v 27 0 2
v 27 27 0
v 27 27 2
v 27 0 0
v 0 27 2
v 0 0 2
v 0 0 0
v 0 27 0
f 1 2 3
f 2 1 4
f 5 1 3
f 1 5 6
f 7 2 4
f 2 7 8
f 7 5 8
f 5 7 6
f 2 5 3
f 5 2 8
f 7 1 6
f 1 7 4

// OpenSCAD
stoneW = 27;
stoneL = 27;
baseH = 2;
rimH = 2;
roofH = 35;
symbolL = 18;
symbolH = 1;
wall = 1;



color("green")
    cube([stoneW, stoneL, 2]);

color("red")
      translate([-11, 42, baseH / 2])
          linear_extrude(
            height = symbolH+baseH / 2, 
            center = false, 
            convexity = 10, 
            twist = 0
      )
          resize([0,symbolL,0], auto=true)
              horse();
            
// Group ID: layer1
module horse() {
	// Group ID: g27
	union() {
		// Group ID: Layer_x0020_1
		union() {
			// Path ID: Pruzkumnik
			difference() {
				bezier_polygon([[[69.04049160000001, -61.67434295], [67.34752356, -61.133533715000006], [67.51211767500001, -59.910834575], [66.195364755, -59.887321130000004]], [[66.195364755, -59.887321130000004], [65.34888073500001, -60.804345485000006], [65.63104207500001, -61.20407405], [65.67806896500001, -62.80298831]], [[65.67806896500001, -62.80298831], [64.220235375, -62.473800080000004], [59.21187159, -57.95921864], [59.89376149500001, -61.180560605000004]], [[59.89376149500001, -61.180560605000004], [59.89376149500001, -61.180560605000004], [61.304568195, -64.566496685], [61.304568195, -64.566496685]], [[61.304568195, -64.566496685], [61.304568195, -64.566496685], [58.106739675, -69.62188736], [58.106739675, -69.62188736]], [[58.106739675, -69.62188736], [57.23674221, -70.3743176], [56.507825415, -70.585938605], [55.96701618, -71.73809741000001]], [[55.96701618, -71.73809741000001], [55.02647838, -73.689713345], [56.131610295, -73.90133435], [55.96701618, -75.45322172]], [[55.96701618, -75.45322172], [55.96701618, -75.45322172], [54.06242713500001, -75.899977175], [54.06242713500001, -75.899977175]], [[54.06242713500001, -75.899977175], [54.250534695000006, -78.03970067], [55.543774170000006, -78.110241005], [57.119174985, -78.95672502500001]], [[57.119174985, -78.95672502500001], [57.119174985, -78.95672502500001], [54.132967470000004, -82.74238967000001], [54.132967470000004, -82.74238967000001]], [[54.132967470000004, -82.74238967000001], [52.5810801, -83.75346780500001], [53.215943115, -82.03698632000001], [50.723517945000005, -86.198866085]], [[50.723517945000005, -86.198866085], [48.748388565000006, -89.49074838500002], [51.664055745000006, -86.38697364500001], [49.47730536, -90.83101475000001]], [[49.47730536, -90.83101475000001], [48.630821340000004, -92.54749623500001], [48.01947177, -94.052356715], [48.53676756, -96.28613399000001]], [[48.53676756, -96.28613399000001], [49.124603685000004, -98.77855916000001], [50.065141485000005, -99.20180117000001], [50.65297761, -100.82422887500002]], [[50.65297761, -100.82422887500002], [51.546488520000004, -103.22260026500001], [50.65297761, -104.28070529000001], [53.968373355000004, -104.09259773000002]], [[53.968373355000004, -104.09259773000002], [56.76647331, -103.95151706000001], [59.56457326500001, -106.67907668000002], [61.845377430000006, -101.64719945000002]], [[61.845377430000006, -101.64719945000002], [61.845377430000006, -101.64719945000002], [62.762401785, -100.49504064500002], [62.762401785, -100.49504064500002]], [[62.762401785, -100.49504064500002], [62.762401785, -100.49504064500002], [63.58537236, -102.86989859000002], [63.58537236, -102.86989859000002]], [[63.58537236, -102.86989859000002], [65.113746285, -102.705304475], [66.242391645, -101.12990366], [66.83022777000001, -100.70666165]], [[66.83022777000001, -100.70666165], [67.20644289, -100.42450031], [67.53563112, -100.35395997500001], [67.95887313, -100.09531208000001]], [[67.95887313, -100.09531208000001], [68.217521025, -98.07315581], [67.371037005, -98.002615475], [67.06536222, -96.16856676500001]], [[67.06536222, -96.16856676500001], [68.19400758, -95.48667686000002], [70.051569735, -94.42857183500001], [71.862105, -94.26397772000001]], [[71.862105, -94.26397772000001], [71.885618445, -95.08694829500001], [71.62697055000001, -95.67478442000001], [71.95615878000001, -96.38018777]], [[71.95615878000001, -96.38018777], [73.76669404500001, -96.75640289], [74.54263773, -96.47424155000002], [75.882904095, -96.05099954]], [[75.882904095, -96.05099954], [76.32965955, -103.22260026500001], [75.130473855, -107.43150692], [79.645055295, -113.380408505]], [[79.645055295, -113.380408505], [80.25640486500001, -114.179865635], [80.303431755, -114.509053865], [81.54964434, -114.60310764500001]], [[81.54964434, -114.60310764500001], [84.27720396000001, -109.242042185], [87.68665348500001, -111.61690013], [95.163928995, -104.821514525]], [[95.163928995, -104.821514525], [95.493117225, -104.56286663], [95.728251675, -104.32773218], [96.03392646, -104.069084285]], [[96.03392646, -104.069084285], [96.762843255, -103.457734715], [96.26906091000001, -103.55178849500001], [97.11554493000001, -103.55178849500001]], [[97.11554493000001, -103.55178849500001], [97.468246605, -107.43150692], [95.37555, -109.43014974500001], [95.540144115, -111.05257745]], [[95.540144115, -111.05257745], [96.92743737, -111.123117785], [100.94823646500001, -108.27799094000001], [101.93580115500001, -105.19772964500001]], [[101.93580115500001, -105.19772964500001], [104.47525321500001, -97.29721212500002], [98.62040541, -91.72452566000001], [100.383913785, -82.906983785]], [[100.383913785, -82.906983785], [101.01877680000001, -79.68564182], [102.52363728, -75.758896505], [102.80579862, -72.53755454]], [[102.80579862, -72.53755454], [103.06444651500001, -69.64540080500001], [101.982828045, -69.739454585], [100.45445412000001, -68.563782335]], [[100.45445412000001, -68.563782335], [98.99662053, -67.45865042], [99.913644885, -67.45865042], [96.856897035, -65.78919582500001]], [[96.856897035, -65.78919582500001], [95.37555, -64.989738695], [94.505552535, -64.237308455], [92.765557605, -63.46136477]], [[92.765557605, -63.46136477], [90.555293775, -62.473800080000004], [89.802863535, -60.192995915000004], [84.206663625, -59.181917780000006]], [[84.206663625, -59.181917780000006], [82.278561135, -58.829216105], [80.32694520000001, -59.558132900000004], [78.422356155, -59.81678079500001]], [[78.422356155, -59.81678079500001], [74.613178065, -60.287049695], [72.44994112500001, -57.042194285], [69.04049160000001, -61.67434295]], [[69.04049160000001, -61.67434295], [69.04049160000001, -61.67434295], [69.04049160000001, -61.67434295], [69.04049160000001, -61.67434295]], [[69.04049160000001, -61.67434295], [69.04049160000001, -61.67434295], [69.04049160000001, -61.67434295], [69.04049160000001, -61.67434295]]]);
				bezier_polygon([[[58.671062355000004, -99.03720705500001], [59.25889848, -100.23639275000001], [58.459441350000006, -99.93071796500001], [57.119174985, -101.97638768]], [[57.119174985, -101.97638768], [56.601879195, -102.752331365], [56.62539264, -102.28206246500001], [56.67241953, -103.01097926]], [[56.67241953, -103.01097926], [58.55349513, -103.410707825], [59.188358145, -102.91692548], [59.91727494, -101.81179356500002]], [[59.91727494, -101.81179356500002], [60.269976615000004, -101.294497775], [61.727810205000004, -98.87261294000001], [61.845377430000006, -98.59045160000001]], [[61.845377430000006, -98.59045160000001], [61.234027860000005, -98.04964236500001], [61.304568195, -97.95558858500002], [60.693218625, -97.46180624000002]], [[60.693218625, -97.46180624000002], [59.658627045, -98.519911265], [60.48159762, -98.37883059500001], [58.671062355000004, -99.03720705500001]], [[58.671062355000004, -99.03720705500001], [58.671062355000004, -99.03720705500001], [58.671062355000004, -99.03720705500001], [58.671062355000004, -99.03720705500001]], [[58.671062355000004, -99.03720705500001], [58.671062355000004, -99.03720705500001], [58.671062355000004, -99.03720705500001], [58.671062355000004, -99.03720705500001]]]);
				bezier_polygon([[[64.90212528, -93.44100714500001], [65.23131351, -94.146410495], [65.60752863, -94.49911217], [66.101310975, -94.96938107]], [[66.101310975, -94.96938107], [68.5702227, -93.79370882], [66.524552985, -94.005329825], [72.14426634, -91.98317355500001]], [[72.14426634, -91.98317355500001], [72.14426634, -91.98317355500001], [72.12075289500001, -88.19750891000001], [72.12075289500001, -88.19750891000001]], [[72.12075289500001, -88.19750891000001], [71.57994366, -88.19750891000001], [65.18428662, -93.08830547000001], [64.90212528, -93.44100714500001]], [[64.90212528, -93.44100714500001], [64.90212528, -93.44100714500001], [64.90212528, -93.44100714500001], [64.90212528, -93.44100714500001]], [[64.90212528, -93.44100714500001], [64.90212528, -93.44100714500001], [64.90212528, -93.44100714500001], [64.90212528, -93.44100714500001]]]);
				bezier_polygon([[[72.37940079, -80.29699139], [68.33508825000001, -81.731311535], [69.769408395, -86.76318876500001], [73.43750581500001, -86.292919865]], [[73.43750581500001, -86.292919865], [77.45830491000001, -85.79913752], [75.177500745, -79.285913255], [72.37940079, -80.29699139]], [[72.37940079, -80.29699139], [72.37940079, -80.29699139], [72.37940079, -80.29699139], [72.37940079, -80.29699139]], [[72.37940079, -80.29699139], [72.37940079, -80.29699139], [72.37940079, -80.29699139], [72.37940079, -80.29699139]]]);
				bezier_polygon([[[57.072148095, -77.33429732], [57.072148095, -77.33429732], [58.388901015, -77.61645866], [58.388901015, -77.61645866]], [[58.388901015, -77.61645866], [59.07079092, -73.736740235], [59.423492595, -73.54863267500001], [61.65726987000001, -71.59701674]], [[61.65726987000001, -71.59701674], [65.019692505, -68.65783611500001], [63.11510346, -70.96215372500001], [63.820506810000005, -68.93999745500001]], [[63.820506810000005, -68.93999745500001], [64.267262265, -67.764325205], [65.489961405, -67.38811008500001], [66.054284085, -66.42405884]], [[66.054284085, -66.42405884], [66.054284085, -66.42405884], [65.63104207500001, -64.80163113500001], [65.63104207500001, -64.80163113500001]], [[65.63104207500001, -64.80163113500001], [64.361316045, -64.989738695], [62.527267335000005, -65.883249605], [61.98645810000001, -66.588652955]], [[61.98645810000001, -66.588652955], [61.351595085, -67.41162353], [61.13997408, -69.034051235], [60.034842165, -70.23323693]], [[60.034842165, -70.23323693], [59.23538503500001, -71.12674784000001], [57.61295733, -71.479449515], [57.777551445, -73.61917301]], [[57.777551445, -73.61917301], [57.848091780000004, -74.6067377], [58.36538757, -74.93592593000001], [58.27133379, -75.71186961500001]], [[58.27133379, -75.71186961500001], [58.177280010000004, -76.72294775], [57.589443885, -76.58186708000001], [57.072148095, -77.33429732]], [[57.072148095, -77.33429732], [57.072148095, -77.33429732], [57.072148095, -77.33429732], [57.072148095, -77.33429732]], [[57.072148095, -77.33429732], [57.072148095, -77.33429732], [57.072148095, -77.33429732], [57.072148095, -77.33429732]]]);
				bezier_polygon([[[73.813720935, -78.862671245], [74.63669151, -78.25132167500001], [75.036420075, -77.61645866], [75.41263519500001, -76.81700153]], [[75.41263519500001, -76.81700153], [70.78048653, -72.11431253], [73.672640265, -68.751889895], [72.23832012, -65.930276495]], [[72.23832012, -65.930276495], [72.23832012, -65.930276495], [71.76805122, -66.494599175], [71.76805122, -66.494599175]], [[71.76805122, -66.494599175], [70.945080645, -67.764325205], [71.43886299, -68.093513435], [69.83994873, -68.39918822]], [[69.83994873, -68.39918822], [69.83994873, -68.39918822], [68.99346471, -66.18892439000001], [68.99346471, -66.18892439000001]], [[68.99346471, -66.18892439000001], [68.687789925, -65.318926925], [68.546709255, -64.566496685], [67.81779246, -64.47244290500001]], [[67.81779246, -64.47244290500001], [67.27698322500001, -64.895684915], [67.51211767500001, -64.54298324], [67.44157734000001, -65.365953815]], [[67.44157734000001, -65.365953815], [67.27698322500001, -67.31756975], [69.5107605, -69.38675291], [70.568865525, -71.54998985]], [[70.568865525, -71.54998985], [71.25075543, -72.91376966], [73.22588481, -78.204294785], [73.813720935, -78.862671245]], [[73.813720935, -78.862671245], [73.813720935, -78.862671245], [73.813720935, -78.862671245], [73.813720935, -78.862671245]], [[73.813720935, -78.862671245], [73.813720935, -78.862671245], [73.813720935, -78.862671245], [73.813720935, -78.862671245]]]);
				bezier_polygon([[[52.39297254, -102.98746581500001], [55.261612830000004, -103.29314060000002], [56.531338860000005, -100.35395997500001], [57.89511867, -98.94315327500001]], [[57.89511867, -98.94315327500001], [57.848091780000004, -98.896126385], [57.777551445, -98.75504571500001], [57.754038, -98.802072605]], [[57.754038, -98.802072605], [57.56593044, -99.20180117000001], [57.495390105000006, -98.54342471000001], [57.47187666000001, -98.49639782000001]], [[57.47187666000001, -98.49639782000001], [56.837013645, -97.69694069000002], [56.62539264, -96.262620545], [57.63647077500001, -95.557217195]], [[57.63647077500001, -95.557217195], [57.63647077500001, -95.557217195], [58.92971025, -94.945867625], [58.92971025, -94.945867625]], [[58.92971025, -94.945867625], [58.318360680000005, -93.37046681000001], [57.401336325, -92.59452312500001], [56.272690965, -91.701012215]], [[56.272690965, -91.701012215], [55.097018715000004, -90.760474415], [54.39161536500001, -89.866963505], [52.76918766, -89.39669460500001]], [[52.76918766, -89.39669460500001], [51.217300290000004, -90.525339965], [49.759466700000004, -93.11181891500001], [50.065141485000005, -96.00397265000001]], [[50.065141485000005, -96.00397265000001], [50.206222155000006, -97.344239015], [50.676491055, -98.472884375], [51.26432718, -99.38990873]], [[51.26432718, -99.38990873], [52.157838090000006, -100.777201985], [52.040270865000004, -101.22395744000002], [52.39297254, -102.98746581500001]], [[52.39297254, -102.98746581500001], [52.39297254, -102.98746581500001], [52.39297254, -102.98746581500001], [52.39297254, -102.98746581500001]], [[52.39297254, -102.98746581500001], [52.39297254, -102.98746581500001], [52.39297254, -102.98746581500001], [52.39297254, -102.98746581500001]]]);
				bezier_polygon([[[51.59351541, -87.75075345500001], [52.25189187, -88.503183695], [52.651620435000005, -88.43264336], [53.545131345, -88.85588537000001]], [[53.545131345, -88.85588537000001], [58.482954795000005, -91.16020298000001], [59.39997915000001, -94.616679395], [61.116460635, -96.709376]], [[61.116460635, -96.709376], [62.033484990000005, -97.83802136], [63.138616905000006, -98.68450538], [63.655912695000005, -100.33044653]], [[63.655912695000005, -100.33044653], [63.655912695000005, -100.33044653], [66.6891471, -98.519911265], [66.6891471, -98.519911265]], [[66.6891471, -98.519911265], [66.26590509, -95.90991887000001], [64.07915470500001, -94.59316595000001], [63.232670685, -92.80614413]], [[63.232670685, -92.80614413], [64.10266815, -90.97209542], [69.81643528500001, -88.24453580000001], [70.568865525, -86.41048709]], [[70.568865525, -86.41048709], [70.568865525, -86.41048709], [69.83994873, -85.65805685000001], [69.83994873, -85.65805685000001]], [[69.83994873, -85.65805685000001], [68.89941093, -85.89319130000001], [66.61860676500001, -87.844807235], [65.819149635, -88.52669714000001]], [[65.819149635, -88.52669714000001], [65.160773175, -89.09101982], [64.502396715, -89.443721495], [63.844020255000004, -90.00804417500001]], [[63.844020255000004, -90.00804417500001], [63.06807657, -90.713447525], [62.80942867500001, -91.20722987], [61.5161892, -91.25425676]], [[61.5161892, -91.25425676], [61.18700097, -90.64290719], [61.18700097, -90.61939374500001], [61.18700097, -89.772909725]], [[61.18700097, -89.772909725], [60.29349006, -90.290205515], [60.34051695, -89.302640825], [57.754038, -87.303998]], [[57.754038, -87.303998], [56.531338860000005, -86.339946755], [55.285126275, -85.07022072500001], [53.56864479, -84.62346527]], [[53.56864479, -84.62346527], [52.816214550000005, -85.18778795], [51.73459608, -86.64562154000001], [51.59351541, -87.75075345500001]], [[51.59351541, -87.75075345500001], [51.59351541, -87.75075345500001], [51.59351541, -87.75075345500001], [51.59351541, -87.75075345500001]], [[51.59351541, -87.75075345500001], [51.59351541, -87.75075345500001], [51.59351541, -87.75075345500001], [51.59351541, -87.75075345500001]]]);
				bezier_polygon([[[55.332153165, -83.75346780500001], [55.332153165, -83.75346780500001], [60.175922835, -88.07994168500001], [60.175922835, -88.07994168500001]], [[60.175922835, -88.07994168500001], [60.834299295, -88.66777781], [61.13997408, -89.208587045], [61.84537743, -89.72588283500001]], [[61.84537743, -89.72588283500001], [63.044563125, -89.302640825], [68.734816815, -84.599951825], [68.781843705, -84.552924935]], [[68.781843705, -84.552924935], [69.205085715, -83.96508881], [68.89941093, -84.62346527], [69.08751849000001, -83.753467805]], [[69.08751849000001, -83.753467805], [69.13454538, -83.51833335500001], [69.15805882500001, -83.142118235], [69.22859916, -82.83644345]], [[69.22859916, -82.83644345], [69.393193275, -82.107526655], [69.5107605, -81.91941909500001], [69.86346217500001, -81.37860986000001]], [[69.86346217500001, -81.37860986000001], [70.63940586000001, -80.20293761], [70.898053755, -80.39104517000001], [70.16913696, -78.627536795]], [[70.16913696, -78.627536795], [69.111031935, -76.06457129], [67.25346978, -72.72566210000001], [65.30185384500001, -71.056207505]], [[65.30185384500001, -71.056207505], [64.267262265, -71.432422625], [62.80942867500001, -72.702148655], [62.17456566, -73.43106545]], [[62.17456566, -73.43106545], [60.881326185000006, -74.912412485], [60.834299295, -74.81835870500001], [60.269976615000004, -77.122676315]], [[60.269976615000004, -77.122676315], [59.635113600000004, -79.87374938], [56.648906085, -80.60266617500001], [55.332153165, -83.75346780500001]], [[55.332153165, -83.75346780500001], [55.332153165, -83.75346780500001], [55.332153165, -83.75346780500001], [55.332153165, -83.75346780500001]], [[55.332153165, -83.75346780500001], [55.332153165, -83.75346780500001], [55.332153165, -83.75346780500001], [55.332153165, -83.75346780500001]]]);
				bezier_polygon([[[81.80829223500001, -110.72338922], [83.548287165, -109.806364865], [82.18450735500001, -110.04149931500001], [87.05179047000001, -107.90177582000001]], [[87.05179047000001, -107.90177582000001], [89.92043076, -106.63204979000001], [94.71717354, -102.84638514500001], [95.869332345, -100.730175095]], [[95.869332345, -100.730175095], [96.41014158000002, -99.76612385000001], [96.01041301500001, -98.66099193500001], [95.72825167500001, -97.579373465]], [[95.72825167500001, -97.579373465], [95.58717100500002, -97.08559112], [95.46960378000001, -96.685862555], [95.23446933000001, -96.16856676500001]], [[95.23446933000001, -96.16856676500001], [95.23446933000001, -96.16856676500001], [94.34095842000002, -94.89884073500001], [94.34095842000002, -94.89884073500001]], [[94.34095842000002, -94.89884073500001], [92.38934248500001, -96.63883566500002], [92.62447693500002, -98.519911265], [91.98961392000001, -101.294497775]], [[91.98961392000001, -101.294497775], [90.74340133500002, -100.871255765], [91.73096602500001, -100.9417961], [90.367186215, -98.91963983]], [[90.367186215, -98.91963983], [87.404492145, -94.45208528], [90.884482005, -90.87804163999999], [90.34367277000001, -89.74939628]], [[90.34367277000001, -89.74939628], [90.34367277000001, -89.74939628], [87.21638458500001, -95.01640796000001], [87.21638458500001, -95.01640796000001]], [[87.21638458500001, -95.01640796000001], [85.64098377, -98.16720959], [86.416927455, -98.990180165], [85.73503755000002, -102.04692801499999]], [[85.73503755000002, -102.04692801499999], [84.300717405, -102.23503557499998], [83.57180061, -100.68314820500001], [82.91342415, -99.977744855]], [[82.91342415, -99.977744855], [79.05721917000001, -95.745324755], [82.889910705, -89.067506375], [82.86639726000001, -87.20994422]], [[82.86639726000001, -87.20994422], [81.62018467500002, -87.86832068], [81.45559056000002, -89.067506375], [80.75018721, -90.243178625]], [[80.75018721, -90.243178625], [76.68236122500001, -89.13804671], [82.44315525000002, -82.718876225], [79.692082185, -79.521047705]], [[79.692082185, -79.521047705], [75.92993098500001, -81.33158297], [79.033705725, -82.93049723], [76.494253665, -86.41048709]], [[76.494253665, -86.41048709], [75.76533687000001, -87.374538335], [75.788850315, -89.443721495], [75.85939065000001, -90.97209542]], [[75.85939065000001, -90.97209542], [75.92993098500001, -92.9472248], [76.89398223, -91.98317355500001], [77.55235869, -94.381544945]], [[77.55235869, -94.381544945], [78.42235615500002, -97.626400355], [77.15263012500002, -105.31529687], [81.10288888500001, -110.041499315]], [[81.10288888500001, -110.041499315], [81.10288888500001, -110.041499315], [81.80829223500001, -110.72338922], [81.80829223500001, -110.72338922]], [[81.80829223500001, -110.72338922], [81.80829223500001, -110.72338922], [81.80829223500001, -110.72338922], [81.80829223500001, -110.72338922]]]);
				bezier_polygon([[[70.615892415, -63.790553], [71.979672225, -64.190281565], [74.07236883, -63.249743765000005], [74.519124285, -68.65783611500001]], [[74.519124285, -68.65783611500001], [74.848312515, -72.749175545], [75.05993352000002, -73.43106545], [77.55235869, -75.21808727000001]], [[77.55235869, -75.21808727000001], [78.82208472, -76.13511162500001], [79.19829984, -75.97051751000001], [80.23289142000002, -77.07564942500001]], [[80.23289142000002, -77.07564942500001], [81.05586199500001, -77.94564689], [81.71423845500001, -78.83915780000001], [82.01991324000001, -80.10888383000001]], [[82.01991324000001, -80.10888383000001], [82.77234348000002, -83.001037565], [80.56207965000002, -85.540489625], [80.58559309500001, -87.93886101500001]], [[80.58559309500001, -87.93886101500001], [80.58559309500001, -87.93886101500001], [82.86639726000001, -85.32886862000001], [82.86639726000001, -85.32886862000001]], [[82.86639726000001, -85.32886862000001], [83.59531405500002, -84.43535771], [82.889910705, -84.74103249500001], [83.94801573000001, -84.52941149]], [[83.94801573000001, -84.52941149], [86.04071233500002, -86.17535264], [84.01855606500001, -89.23210049000001], [83.87747539500002, -89.53777527500002]], [[83.87747539500002, -89.53777527500002], [82.96045104000001, -91.60695843500002], [81.87883257000001, -97.15613145500001], [84.30071740500001, -99.06072050000002]], [[84.30071740500001, -99.06072050000002], [85.42936276500001, -93.13533236], [87.42800559000003, -92.57100968000002], [88.72124506500002, -89.81993661500002]], [[88.72124506500002, -89.81993661500002], [89.56772908500002, -87.98588790500001], [89.07394674000001, -87.68021312000002], [89.42664841500002, -86.01075852500001]], [[89.42664841500002, -86.01075852500001], [91.56637191000002, -85.91670474500002], [92.36582904000002, -88.85588537000001], [92.22474837000001, -91.20722987000002]], [[92.22474837000001, -91.20722987000002], [92.08366770000003, -93.41749370000002], [90.27313243500004, -95.65127097500002], [91.40177779500002, -98.02612892000002]], [[91.40177779500002, -98.02612892000002], [92.57745004500002, -97.03856423], [92.60096349000003, -94.31100461000001], [94.88176765500002, -93.01776513500002]], [[94.88176765500002, -93.01776513500002], [96.76284325500002, -93.91127604500002], [97.25662560000002, -97.22667179000001], [97.75040794500002, -99.48396251000001]], [[97.75040794500002, -99.48396251000001], [98.47932474000001, -102.82287170000001], [98.29121718000002, -104.35124562500002], [97.86797517000002, -107.64312792500002]], [[97.86797517000002, -107.64312792500002], [98.92608019500003, -106.46745567500001], [99.34932220500002, -106.06772711], [99.96067177500002, -104.25719184500001]], [[99.96067177500002, -104.25719184500001], [101.91228771000002, -98.61396504500001], [99.13770120000001, -96.356674325], [97.86797517000002, -90.92506853]], [[97.86797517000002, -90.92506853], [97.02149115, -87.37453833500001], [97.56230038500001, -83.96508881], [98.267703735, -80.743746845]], [[98.267703735, -80.743746845], [99.04364742000001, -77.216730095], [100.21931967, -74.70079148], [100.336886895, -71.056207505]], [[100.336886895, -71.056207505], [98.173649955, -70.115669705], [95.84581890000001, -67.67027142500001], [94.082310525, -66.42405884]], [[94.082310525, -66.42405884], [92.69501727, -65.43649415], [91.42529124, -65.648115155], [90.037997985, -64.848658025]], [[90.037997985, -64.848658025], [88.65070473, -64.049200895], [88.86232573500001, -63.226230320000006], [87.00476358, -62.285692520000005]], [[87.00476358, -62.285692520000005], [82.25504769, -59.887321130000004], [81.50261745, -62.285692520000005], [77.575872135, -62.121098405000005]], [[77.575872135, -62.121098405000005], [75.741823425, -62.027044625], [70.427784855, -58.570568210000005], [70.615892415, -63.790553]], [[70.615892415, -63.790553], [70.615892415, -63.790553], [70.615892415, -63.790553], [70.615892415, -63.790553]], [[70.615892415, -63.790553], [70.615892415, -63.790553], [70.615892415, -63.790553], [70.615892415, -63.790553]]]);
			}
			bezier_polygon([[[51.96973053, -97.39126590500001], [53.639185125000004, -96.685862555], [50.582437275000004, -98.237749925], [52.628106990000006, -96.920997005]], [[52.628106990000006, -96.920997005], [53.004322110000004, -96.66234911000001], [52.698647325, -96.685862555], [53.357023785, -96.52126844]], [[53.357023785, -96.52126844], [54.485669145, -99.24882806], [52.839727995000004, -99.50747595500002], [53.262970005, -100.84774232000001]], [[53.262970005, -100.84774232000001], [54.955938045, -100.118825525], [56.037556515000006, -96.80342978], [54.744317040000006, -94.8283004]], [[54.744317040000006, -94.8283004], [52.816214550000005, -91.86560633], [49.430278470000005, -95.039921405], [51.96973053, -97.39126590500001]], [[51.96973053, -97.39126590500001], [51.96973053, -97.39126590500001], [51.96973053, -97.39126590500001], [51.96973053, -97.39126590500001]], [[51.96973053, -97.39126590500001], [51.96973053, -97.39126590500001], [51.96973053, -97.39126590500001], [51.96973053, -97.39126590500001]]]);
			bezier_polygon([[[60.29349006, -82.08401321], [61.46916231, -82.107526655], [61.304568195, -81.80185187000001], [62.104025325, -81.21401574500001]], [[62.104025325, -81.21401574500001], [66.33644542500001, -82.295634215], [65.37239418, -79.82672249000001], [65.70158241, -78.439429235]], [[65.70158241, -78.439429235], [65.98374375, -77.33429732], [66.31293198, -78.27483512], [66.6891471, -76.793488085]], [[66.6891471, -76.793488085], [62.621321115, -76.67592086], [60.24646317, -79.756182155], [60.29349006, -82.08401321]], [[60.29349006, -82.08401321], [60.29349006, -82.08401321], [60.29349006, -82.08401321], [60.29349006, -82.08401321]], [[60.29349006, -82.08401321], [60.29349006, -82.08401321], [60.29349006, -82.08401321], [60.29349006, -82.08401321]]]);
		}
	}
}

/**
 * Stripped down version of "bezier_v2.scad".
 * For full version, see: https://www.thingiverse.com/thing:2170645
 */

function BEZ03(u) = pow((1-u), 3);
function BEZ13(u) = 3*u*(pow((1-u),2));
function BEZ23(u) = 3*(pow(u,2))*(1-u);
function BEZ33(u) = pow(u,3);

function bezier_2D_point(p0, p1, p2, p3, u) = [
	BEZ03(u)*p0[0]+BEZ13(u)*p1[0]+BEZ23(u)*p2[0]+BEZ33(u)*p3[0],
	BEZ03(u)*p0[1]+BEZ13(u)*p1[1]+BEZ23(u)*p2[1]+BEZ33(u)*p3[1]
];

function bezier_coordinates(points, steps) = [
	for (c = points)
		for (step = [0:steps])
			bezier_2D_point(c[0], c[1], c[2],c[3], step/steps)
];

module bezier_polygon(points) {
	steps = $fn <= 0 ? 30 : $fn;
	polygon(bezier_coordinates(points, steps));
}
            
